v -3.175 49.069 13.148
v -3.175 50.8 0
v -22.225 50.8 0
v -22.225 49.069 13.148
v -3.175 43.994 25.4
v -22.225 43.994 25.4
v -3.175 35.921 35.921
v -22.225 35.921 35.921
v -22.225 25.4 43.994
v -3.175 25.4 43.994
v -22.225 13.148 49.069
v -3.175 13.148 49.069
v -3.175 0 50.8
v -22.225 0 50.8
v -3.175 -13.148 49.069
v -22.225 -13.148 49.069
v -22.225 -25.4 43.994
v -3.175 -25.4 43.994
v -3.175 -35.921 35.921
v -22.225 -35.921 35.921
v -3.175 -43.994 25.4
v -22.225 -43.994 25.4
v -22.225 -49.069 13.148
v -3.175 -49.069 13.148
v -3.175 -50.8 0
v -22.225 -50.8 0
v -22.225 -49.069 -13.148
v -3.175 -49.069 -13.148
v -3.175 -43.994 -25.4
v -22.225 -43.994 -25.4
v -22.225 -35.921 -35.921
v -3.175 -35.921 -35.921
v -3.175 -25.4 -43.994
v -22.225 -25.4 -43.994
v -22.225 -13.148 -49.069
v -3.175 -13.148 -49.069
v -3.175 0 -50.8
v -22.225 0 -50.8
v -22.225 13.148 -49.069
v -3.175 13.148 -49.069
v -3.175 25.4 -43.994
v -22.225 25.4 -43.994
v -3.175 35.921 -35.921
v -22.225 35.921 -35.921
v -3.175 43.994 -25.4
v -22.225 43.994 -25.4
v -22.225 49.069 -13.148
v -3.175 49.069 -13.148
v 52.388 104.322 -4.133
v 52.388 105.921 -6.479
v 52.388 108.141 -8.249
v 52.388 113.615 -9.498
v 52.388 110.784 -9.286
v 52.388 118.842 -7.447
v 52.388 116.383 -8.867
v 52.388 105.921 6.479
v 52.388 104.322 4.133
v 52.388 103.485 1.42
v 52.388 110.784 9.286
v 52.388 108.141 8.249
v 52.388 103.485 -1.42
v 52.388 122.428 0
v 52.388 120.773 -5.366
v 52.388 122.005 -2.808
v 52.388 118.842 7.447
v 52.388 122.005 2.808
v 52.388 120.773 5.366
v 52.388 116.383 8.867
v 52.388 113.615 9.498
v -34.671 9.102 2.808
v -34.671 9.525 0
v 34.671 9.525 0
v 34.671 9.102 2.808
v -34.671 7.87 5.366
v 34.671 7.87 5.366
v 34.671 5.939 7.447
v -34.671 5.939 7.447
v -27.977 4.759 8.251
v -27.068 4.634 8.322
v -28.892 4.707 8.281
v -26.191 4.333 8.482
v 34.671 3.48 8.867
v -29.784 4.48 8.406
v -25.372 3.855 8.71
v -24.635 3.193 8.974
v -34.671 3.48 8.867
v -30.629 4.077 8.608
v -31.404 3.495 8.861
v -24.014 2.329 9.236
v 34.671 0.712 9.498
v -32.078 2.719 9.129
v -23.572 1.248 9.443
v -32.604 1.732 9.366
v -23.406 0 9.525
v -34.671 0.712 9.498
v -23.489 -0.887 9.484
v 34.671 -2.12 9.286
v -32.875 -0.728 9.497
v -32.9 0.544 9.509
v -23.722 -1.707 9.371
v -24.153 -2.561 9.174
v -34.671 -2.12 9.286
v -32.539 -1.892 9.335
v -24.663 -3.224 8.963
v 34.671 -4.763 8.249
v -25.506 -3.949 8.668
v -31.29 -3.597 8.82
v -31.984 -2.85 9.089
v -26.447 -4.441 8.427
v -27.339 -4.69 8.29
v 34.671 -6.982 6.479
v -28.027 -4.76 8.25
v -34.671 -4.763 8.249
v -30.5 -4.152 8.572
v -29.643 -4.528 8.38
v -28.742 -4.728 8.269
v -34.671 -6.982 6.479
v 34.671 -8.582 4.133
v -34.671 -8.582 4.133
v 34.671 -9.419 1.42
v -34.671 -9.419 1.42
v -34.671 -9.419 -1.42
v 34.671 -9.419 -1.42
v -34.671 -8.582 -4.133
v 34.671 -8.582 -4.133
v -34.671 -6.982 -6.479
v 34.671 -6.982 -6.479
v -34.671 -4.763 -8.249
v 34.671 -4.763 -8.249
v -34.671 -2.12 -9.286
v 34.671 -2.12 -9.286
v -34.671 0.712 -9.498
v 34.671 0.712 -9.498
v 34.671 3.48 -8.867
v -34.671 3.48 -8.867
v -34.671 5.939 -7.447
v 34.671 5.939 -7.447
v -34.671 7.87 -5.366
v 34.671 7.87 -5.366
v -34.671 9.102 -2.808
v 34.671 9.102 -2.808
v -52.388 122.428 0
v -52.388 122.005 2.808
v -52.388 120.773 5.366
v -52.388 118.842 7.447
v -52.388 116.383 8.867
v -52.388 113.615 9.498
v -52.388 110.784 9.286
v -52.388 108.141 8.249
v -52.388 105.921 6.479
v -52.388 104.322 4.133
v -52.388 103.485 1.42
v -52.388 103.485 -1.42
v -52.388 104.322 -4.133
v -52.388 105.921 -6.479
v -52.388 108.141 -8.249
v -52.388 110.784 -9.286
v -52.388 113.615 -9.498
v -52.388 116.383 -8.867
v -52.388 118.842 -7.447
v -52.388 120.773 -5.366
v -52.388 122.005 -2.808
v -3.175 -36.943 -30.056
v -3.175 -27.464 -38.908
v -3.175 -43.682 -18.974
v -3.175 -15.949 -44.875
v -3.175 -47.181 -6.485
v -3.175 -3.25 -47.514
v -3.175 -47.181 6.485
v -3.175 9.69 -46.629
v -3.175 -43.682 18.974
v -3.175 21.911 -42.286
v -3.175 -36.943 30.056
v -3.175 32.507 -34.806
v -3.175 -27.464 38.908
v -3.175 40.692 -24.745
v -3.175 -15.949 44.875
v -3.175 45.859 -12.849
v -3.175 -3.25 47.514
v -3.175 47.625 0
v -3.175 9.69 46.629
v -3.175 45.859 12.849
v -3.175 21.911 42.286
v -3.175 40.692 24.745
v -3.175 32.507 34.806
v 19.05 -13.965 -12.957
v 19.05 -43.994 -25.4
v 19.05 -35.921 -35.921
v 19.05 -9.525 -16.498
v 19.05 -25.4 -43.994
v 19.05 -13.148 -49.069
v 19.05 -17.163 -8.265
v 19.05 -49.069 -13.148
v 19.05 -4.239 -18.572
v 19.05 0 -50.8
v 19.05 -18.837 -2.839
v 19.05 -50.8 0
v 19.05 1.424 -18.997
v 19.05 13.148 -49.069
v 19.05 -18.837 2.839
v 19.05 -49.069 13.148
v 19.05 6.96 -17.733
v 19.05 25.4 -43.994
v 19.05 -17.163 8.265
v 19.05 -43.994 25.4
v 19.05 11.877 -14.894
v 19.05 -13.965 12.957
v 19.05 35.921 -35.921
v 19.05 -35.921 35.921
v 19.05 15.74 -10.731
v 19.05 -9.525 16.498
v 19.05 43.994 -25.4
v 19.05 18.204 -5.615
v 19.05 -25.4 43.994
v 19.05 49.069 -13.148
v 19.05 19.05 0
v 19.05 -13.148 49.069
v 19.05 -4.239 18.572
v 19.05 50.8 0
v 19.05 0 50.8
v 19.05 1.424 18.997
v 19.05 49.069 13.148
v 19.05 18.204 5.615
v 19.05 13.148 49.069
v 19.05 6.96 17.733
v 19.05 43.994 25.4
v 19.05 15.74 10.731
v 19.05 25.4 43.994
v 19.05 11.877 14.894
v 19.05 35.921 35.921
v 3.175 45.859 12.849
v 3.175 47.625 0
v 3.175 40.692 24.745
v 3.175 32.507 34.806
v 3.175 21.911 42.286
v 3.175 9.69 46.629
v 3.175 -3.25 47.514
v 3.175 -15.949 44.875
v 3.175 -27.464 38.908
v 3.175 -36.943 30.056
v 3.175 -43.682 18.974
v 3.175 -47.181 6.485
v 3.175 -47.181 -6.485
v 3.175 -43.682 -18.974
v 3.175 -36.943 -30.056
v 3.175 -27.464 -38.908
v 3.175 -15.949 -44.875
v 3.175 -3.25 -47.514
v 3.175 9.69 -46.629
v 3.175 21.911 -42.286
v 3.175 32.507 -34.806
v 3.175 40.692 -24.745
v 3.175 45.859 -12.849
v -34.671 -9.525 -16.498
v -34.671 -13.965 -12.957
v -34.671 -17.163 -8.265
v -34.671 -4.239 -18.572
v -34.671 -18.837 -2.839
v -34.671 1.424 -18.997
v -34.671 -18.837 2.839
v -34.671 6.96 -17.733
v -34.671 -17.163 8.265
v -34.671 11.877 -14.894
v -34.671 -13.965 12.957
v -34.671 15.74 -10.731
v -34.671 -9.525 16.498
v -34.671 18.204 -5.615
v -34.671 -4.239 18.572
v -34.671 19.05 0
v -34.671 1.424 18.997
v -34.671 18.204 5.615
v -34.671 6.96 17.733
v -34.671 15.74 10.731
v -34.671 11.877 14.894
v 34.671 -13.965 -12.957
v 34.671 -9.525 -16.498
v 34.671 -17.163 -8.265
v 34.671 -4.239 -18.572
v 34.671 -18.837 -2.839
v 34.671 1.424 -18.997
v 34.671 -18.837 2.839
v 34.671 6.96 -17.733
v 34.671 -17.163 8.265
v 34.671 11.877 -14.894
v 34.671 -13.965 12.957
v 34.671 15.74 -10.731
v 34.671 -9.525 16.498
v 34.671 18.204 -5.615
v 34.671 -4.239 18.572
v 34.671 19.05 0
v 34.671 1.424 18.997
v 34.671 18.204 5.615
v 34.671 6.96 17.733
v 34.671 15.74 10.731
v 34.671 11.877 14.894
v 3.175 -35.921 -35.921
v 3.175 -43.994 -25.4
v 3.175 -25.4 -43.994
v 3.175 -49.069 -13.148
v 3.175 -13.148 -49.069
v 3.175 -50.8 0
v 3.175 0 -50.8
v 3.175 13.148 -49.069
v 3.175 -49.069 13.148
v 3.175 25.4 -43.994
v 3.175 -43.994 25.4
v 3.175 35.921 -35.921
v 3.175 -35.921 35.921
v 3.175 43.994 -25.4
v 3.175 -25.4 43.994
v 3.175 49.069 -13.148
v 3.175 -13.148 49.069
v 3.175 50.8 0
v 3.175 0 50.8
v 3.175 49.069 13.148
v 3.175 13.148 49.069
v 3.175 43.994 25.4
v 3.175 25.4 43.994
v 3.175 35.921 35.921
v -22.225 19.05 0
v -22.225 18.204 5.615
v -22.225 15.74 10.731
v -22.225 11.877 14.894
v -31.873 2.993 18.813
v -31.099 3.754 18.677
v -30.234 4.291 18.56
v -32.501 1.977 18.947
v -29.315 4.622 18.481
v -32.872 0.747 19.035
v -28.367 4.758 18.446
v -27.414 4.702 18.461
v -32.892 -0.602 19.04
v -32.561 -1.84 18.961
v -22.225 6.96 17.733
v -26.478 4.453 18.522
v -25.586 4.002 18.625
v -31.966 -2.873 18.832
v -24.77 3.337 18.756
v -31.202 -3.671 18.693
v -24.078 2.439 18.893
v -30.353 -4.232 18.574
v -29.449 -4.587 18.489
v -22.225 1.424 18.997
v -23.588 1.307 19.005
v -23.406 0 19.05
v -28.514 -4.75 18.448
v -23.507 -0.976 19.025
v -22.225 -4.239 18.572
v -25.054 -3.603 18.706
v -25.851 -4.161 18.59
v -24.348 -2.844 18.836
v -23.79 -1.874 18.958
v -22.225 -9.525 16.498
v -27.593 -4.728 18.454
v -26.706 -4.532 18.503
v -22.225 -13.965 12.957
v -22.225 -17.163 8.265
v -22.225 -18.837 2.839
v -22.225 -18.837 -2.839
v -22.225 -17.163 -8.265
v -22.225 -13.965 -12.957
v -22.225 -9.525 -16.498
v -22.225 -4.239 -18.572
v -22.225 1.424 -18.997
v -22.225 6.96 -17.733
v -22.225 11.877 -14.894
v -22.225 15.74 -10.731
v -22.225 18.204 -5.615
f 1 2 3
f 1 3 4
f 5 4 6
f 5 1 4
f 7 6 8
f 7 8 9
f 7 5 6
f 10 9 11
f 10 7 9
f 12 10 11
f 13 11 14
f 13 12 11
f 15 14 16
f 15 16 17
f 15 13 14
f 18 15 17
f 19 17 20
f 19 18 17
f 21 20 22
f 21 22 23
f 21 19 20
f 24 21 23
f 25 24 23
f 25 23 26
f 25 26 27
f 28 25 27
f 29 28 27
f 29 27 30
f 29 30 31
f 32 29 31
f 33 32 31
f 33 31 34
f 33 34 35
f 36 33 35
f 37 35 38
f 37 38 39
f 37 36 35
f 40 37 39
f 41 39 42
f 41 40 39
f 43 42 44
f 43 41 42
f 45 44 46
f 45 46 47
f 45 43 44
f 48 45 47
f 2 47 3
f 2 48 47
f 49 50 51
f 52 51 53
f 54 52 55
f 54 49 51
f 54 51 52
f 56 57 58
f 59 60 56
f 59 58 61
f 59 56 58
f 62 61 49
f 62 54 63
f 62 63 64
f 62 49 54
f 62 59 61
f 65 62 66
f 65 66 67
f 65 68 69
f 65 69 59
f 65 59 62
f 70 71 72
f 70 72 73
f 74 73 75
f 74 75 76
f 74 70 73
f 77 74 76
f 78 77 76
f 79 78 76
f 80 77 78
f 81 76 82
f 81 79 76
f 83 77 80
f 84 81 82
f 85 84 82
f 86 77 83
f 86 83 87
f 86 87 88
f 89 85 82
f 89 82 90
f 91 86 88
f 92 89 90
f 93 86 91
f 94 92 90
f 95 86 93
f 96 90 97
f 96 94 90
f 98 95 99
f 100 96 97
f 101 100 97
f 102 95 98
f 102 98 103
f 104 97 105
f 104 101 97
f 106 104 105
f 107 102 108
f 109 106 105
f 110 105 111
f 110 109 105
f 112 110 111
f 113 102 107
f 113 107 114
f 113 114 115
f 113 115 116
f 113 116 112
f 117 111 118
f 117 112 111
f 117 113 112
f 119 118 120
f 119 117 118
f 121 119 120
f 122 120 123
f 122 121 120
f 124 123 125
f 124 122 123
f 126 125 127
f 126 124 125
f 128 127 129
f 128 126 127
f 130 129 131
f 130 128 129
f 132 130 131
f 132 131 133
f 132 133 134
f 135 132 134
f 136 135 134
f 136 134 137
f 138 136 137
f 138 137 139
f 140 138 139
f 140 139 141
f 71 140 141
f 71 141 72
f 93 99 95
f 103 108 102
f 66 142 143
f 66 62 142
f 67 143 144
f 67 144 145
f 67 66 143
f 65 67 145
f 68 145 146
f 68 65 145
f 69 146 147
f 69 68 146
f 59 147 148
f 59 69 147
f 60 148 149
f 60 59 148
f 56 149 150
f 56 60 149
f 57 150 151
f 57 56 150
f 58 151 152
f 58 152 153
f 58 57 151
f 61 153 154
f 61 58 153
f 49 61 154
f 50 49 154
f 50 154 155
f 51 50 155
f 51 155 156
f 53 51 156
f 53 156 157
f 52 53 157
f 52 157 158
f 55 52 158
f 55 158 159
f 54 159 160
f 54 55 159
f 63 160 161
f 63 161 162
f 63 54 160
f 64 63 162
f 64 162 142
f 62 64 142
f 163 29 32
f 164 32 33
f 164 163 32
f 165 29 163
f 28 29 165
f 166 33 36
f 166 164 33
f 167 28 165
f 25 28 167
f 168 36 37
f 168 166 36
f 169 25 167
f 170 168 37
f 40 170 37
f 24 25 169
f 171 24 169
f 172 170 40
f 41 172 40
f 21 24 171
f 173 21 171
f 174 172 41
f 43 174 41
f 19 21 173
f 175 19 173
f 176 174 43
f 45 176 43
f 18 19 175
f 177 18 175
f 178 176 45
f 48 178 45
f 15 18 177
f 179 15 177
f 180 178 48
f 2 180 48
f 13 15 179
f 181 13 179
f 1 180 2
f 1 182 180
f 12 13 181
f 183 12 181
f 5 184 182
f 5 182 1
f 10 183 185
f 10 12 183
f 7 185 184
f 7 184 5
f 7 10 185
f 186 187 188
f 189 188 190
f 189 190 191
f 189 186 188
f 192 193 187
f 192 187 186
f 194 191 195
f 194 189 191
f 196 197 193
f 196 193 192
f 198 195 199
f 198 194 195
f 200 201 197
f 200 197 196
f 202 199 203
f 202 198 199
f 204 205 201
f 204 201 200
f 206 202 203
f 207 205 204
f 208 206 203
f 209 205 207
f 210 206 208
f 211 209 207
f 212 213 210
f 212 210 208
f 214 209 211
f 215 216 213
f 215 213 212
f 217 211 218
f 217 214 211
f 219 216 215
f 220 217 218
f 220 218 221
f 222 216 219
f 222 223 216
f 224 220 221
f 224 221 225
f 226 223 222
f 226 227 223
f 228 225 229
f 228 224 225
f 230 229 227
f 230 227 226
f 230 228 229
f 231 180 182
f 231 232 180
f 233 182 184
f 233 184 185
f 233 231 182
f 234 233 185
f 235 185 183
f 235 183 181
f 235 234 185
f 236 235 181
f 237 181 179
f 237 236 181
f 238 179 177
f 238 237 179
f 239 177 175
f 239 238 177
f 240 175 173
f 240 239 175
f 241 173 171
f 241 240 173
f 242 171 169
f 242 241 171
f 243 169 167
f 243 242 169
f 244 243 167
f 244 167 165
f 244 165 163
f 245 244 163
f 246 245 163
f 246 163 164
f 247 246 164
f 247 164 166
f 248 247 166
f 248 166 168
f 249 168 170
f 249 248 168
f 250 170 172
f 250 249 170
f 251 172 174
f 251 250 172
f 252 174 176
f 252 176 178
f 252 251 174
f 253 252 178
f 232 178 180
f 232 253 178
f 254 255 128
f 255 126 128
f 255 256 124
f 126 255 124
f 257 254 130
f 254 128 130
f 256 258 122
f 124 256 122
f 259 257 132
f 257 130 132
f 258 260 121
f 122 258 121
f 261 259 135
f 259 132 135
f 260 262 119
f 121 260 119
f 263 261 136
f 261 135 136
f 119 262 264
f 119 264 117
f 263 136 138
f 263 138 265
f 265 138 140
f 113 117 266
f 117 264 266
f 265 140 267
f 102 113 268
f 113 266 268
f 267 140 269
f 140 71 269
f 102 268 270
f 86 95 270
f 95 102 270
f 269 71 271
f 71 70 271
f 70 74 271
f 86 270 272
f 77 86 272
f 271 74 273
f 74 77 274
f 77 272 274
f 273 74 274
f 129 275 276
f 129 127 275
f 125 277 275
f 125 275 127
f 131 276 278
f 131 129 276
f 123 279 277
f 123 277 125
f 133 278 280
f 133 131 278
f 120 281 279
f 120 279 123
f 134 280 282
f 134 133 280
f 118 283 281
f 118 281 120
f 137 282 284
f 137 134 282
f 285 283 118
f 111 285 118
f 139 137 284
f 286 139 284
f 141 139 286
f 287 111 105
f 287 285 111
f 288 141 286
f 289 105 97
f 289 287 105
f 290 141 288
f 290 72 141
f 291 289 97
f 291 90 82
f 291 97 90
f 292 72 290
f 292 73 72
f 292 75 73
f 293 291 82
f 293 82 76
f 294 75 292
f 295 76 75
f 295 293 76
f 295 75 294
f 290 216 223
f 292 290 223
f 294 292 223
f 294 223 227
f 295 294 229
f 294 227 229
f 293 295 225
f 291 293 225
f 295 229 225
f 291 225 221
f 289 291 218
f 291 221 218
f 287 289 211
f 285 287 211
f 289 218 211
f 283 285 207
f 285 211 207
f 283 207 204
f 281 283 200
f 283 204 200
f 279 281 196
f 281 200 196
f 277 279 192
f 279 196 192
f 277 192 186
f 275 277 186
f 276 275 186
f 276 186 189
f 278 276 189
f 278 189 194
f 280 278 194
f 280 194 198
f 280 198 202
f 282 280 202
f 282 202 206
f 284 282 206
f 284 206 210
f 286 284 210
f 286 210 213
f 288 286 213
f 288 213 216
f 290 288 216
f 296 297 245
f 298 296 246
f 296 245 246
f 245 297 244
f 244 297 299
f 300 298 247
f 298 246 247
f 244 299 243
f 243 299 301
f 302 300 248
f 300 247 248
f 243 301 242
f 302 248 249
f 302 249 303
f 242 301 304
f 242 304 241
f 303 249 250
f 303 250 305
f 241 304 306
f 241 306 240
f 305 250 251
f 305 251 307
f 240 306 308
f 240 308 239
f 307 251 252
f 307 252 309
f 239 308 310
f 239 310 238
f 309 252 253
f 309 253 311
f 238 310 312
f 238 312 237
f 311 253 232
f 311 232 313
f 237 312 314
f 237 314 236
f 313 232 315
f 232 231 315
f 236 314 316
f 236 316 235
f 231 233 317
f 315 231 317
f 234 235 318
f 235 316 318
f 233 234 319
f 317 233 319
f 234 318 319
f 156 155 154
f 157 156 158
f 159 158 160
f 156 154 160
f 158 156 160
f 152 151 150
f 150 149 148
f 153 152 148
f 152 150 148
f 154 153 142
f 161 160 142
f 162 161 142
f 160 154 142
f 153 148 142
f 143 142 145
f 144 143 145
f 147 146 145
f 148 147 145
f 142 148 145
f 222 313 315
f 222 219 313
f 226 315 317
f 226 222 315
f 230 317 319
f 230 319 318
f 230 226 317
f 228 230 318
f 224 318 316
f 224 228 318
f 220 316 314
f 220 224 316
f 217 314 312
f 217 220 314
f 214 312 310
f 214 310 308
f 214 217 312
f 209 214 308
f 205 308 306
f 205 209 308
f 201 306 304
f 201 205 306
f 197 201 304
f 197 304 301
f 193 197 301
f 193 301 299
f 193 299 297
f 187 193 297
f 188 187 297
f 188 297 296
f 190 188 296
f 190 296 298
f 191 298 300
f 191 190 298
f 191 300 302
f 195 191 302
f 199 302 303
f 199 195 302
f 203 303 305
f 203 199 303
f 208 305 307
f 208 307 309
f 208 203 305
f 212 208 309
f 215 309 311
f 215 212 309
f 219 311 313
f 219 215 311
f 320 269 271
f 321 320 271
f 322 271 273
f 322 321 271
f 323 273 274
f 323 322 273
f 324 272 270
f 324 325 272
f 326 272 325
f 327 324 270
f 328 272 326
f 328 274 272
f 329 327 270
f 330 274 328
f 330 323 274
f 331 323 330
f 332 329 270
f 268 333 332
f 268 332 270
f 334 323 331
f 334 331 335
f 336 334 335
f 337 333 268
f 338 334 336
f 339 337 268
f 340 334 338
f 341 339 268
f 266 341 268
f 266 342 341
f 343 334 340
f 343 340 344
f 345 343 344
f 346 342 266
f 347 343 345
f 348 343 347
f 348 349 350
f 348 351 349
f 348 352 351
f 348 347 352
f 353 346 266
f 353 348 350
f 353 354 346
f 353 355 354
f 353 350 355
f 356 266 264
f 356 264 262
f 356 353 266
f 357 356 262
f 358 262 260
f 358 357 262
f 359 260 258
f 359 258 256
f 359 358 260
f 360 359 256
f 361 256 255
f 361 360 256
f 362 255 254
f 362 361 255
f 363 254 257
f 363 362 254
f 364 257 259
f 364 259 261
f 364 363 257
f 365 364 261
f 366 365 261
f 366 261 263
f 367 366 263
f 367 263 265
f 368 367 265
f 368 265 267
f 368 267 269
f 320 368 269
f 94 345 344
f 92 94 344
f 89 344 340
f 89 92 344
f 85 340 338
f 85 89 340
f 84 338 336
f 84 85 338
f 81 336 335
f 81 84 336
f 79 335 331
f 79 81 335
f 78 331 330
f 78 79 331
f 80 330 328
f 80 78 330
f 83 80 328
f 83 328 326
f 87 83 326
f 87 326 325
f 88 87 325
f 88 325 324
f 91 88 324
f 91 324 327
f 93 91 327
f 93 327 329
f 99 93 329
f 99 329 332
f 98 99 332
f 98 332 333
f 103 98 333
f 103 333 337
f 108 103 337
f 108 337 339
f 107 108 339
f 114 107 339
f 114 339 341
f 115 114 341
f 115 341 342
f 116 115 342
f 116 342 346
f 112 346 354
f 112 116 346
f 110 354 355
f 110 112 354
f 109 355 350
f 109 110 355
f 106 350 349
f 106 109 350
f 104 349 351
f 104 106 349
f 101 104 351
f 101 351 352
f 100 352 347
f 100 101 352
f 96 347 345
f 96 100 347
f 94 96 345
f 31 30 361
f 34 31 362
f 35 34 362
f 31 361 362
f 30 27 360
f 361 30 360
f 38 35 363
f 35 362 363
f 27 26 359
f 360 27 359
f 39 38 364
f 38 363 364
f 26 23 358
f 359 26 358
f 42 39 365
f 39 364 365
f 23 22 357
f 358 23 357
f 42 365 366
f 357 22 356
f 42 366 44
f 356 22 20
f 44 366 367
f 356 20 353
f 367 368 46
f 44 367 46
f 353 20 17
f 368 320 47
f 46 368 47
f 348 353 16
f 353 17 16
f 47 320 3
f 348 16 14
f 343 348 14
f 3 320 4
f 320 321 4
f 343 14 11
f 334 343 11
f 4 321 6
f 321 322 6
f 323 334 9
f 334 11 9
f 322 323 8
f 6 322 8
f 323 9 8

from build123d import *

# Parameters (mm, degrees)
F0_R        = 19.05
F0_R_2      = 9.525
F2_DEPTH    = 34.671
F3_R        = 50.8
F3_R_2      = 47.625
F4_DEPTH    = 22.225
F5_DEPTH    = 56.897
F4_FACE_R   = 50.8
F4_FACE_R_2 = 19.05
F6_DEPTH    = 3.175
F7_R        = 4.7625
F8_DEPTH    = 25.4
F1_R        = 9.525
F9_DEPTH    = 52.3875


with BuildPart() as f2:
    # F0 (on Right) → F2 (new body, symmetric)
    with BuildSketch(Plane.YZ):
        Circle(F0_R)
        Circle(F0_R_2, mode=Mode.SUBTRACT)
    extrude(amount=F2_DEPTH, both=True)

    # F3 (on Right) → F4 (join, symmetric)
    with BuildSketch(Plane.YZ):
        Circle(F3_R)
        Circle(F3_R_2, mode=Mode.SUBTRACT)
        Circle(F3_R_2)
    extrude(amount=F4_DEPTH, both=True)

    # F5 (cut, through all): a face of the model
    f5_faces = [f2.faces().sort_by_distance(p)[0] for p in [
        (22.225, 0, 0),
    ]]
    extrude(f5_faces, amount=-F5_DEPTH, mode=Mode.SUBTRACT)

    # F3 (on Right) + F4_face (on face) → F6 (cut, symmetric)
    with BuildSketch(Plane.YZ):
        Circle(F3_R)
        Circle(F3_R_2, mode=Mode.SUBTRACT)
    with BuildSketch(Plane.YZ.offset(22.225)):
        Circle(F4_FACE_R)
        Circle(F4_FACE_R_2, mode=Mode.SUBTRACT)
    extrude(amount=F6_DEPTH, both=True, mode=Mode.SUBTRACT)

    # F7 (on Top) → F8 (cut)
    with BuildSketch(Plane.XY):
        with Locations((-28.1682106339, 0)):
            Circle(F7_R)
    extrude(amount=F8_DEPTH, mode=Mode.SUBTRACT)


with BuildPart() as f9:
    # F1 (on Right) → F9 (new body, symmetric)
    with BuildSketch(Plane.YZ):
        with Locations((112.9034556301, 0)):
            Circle(F1_R)
    extrude(amount=F9_DEPTH, both=True)


solid = Compound([f2.part, f9.part])
